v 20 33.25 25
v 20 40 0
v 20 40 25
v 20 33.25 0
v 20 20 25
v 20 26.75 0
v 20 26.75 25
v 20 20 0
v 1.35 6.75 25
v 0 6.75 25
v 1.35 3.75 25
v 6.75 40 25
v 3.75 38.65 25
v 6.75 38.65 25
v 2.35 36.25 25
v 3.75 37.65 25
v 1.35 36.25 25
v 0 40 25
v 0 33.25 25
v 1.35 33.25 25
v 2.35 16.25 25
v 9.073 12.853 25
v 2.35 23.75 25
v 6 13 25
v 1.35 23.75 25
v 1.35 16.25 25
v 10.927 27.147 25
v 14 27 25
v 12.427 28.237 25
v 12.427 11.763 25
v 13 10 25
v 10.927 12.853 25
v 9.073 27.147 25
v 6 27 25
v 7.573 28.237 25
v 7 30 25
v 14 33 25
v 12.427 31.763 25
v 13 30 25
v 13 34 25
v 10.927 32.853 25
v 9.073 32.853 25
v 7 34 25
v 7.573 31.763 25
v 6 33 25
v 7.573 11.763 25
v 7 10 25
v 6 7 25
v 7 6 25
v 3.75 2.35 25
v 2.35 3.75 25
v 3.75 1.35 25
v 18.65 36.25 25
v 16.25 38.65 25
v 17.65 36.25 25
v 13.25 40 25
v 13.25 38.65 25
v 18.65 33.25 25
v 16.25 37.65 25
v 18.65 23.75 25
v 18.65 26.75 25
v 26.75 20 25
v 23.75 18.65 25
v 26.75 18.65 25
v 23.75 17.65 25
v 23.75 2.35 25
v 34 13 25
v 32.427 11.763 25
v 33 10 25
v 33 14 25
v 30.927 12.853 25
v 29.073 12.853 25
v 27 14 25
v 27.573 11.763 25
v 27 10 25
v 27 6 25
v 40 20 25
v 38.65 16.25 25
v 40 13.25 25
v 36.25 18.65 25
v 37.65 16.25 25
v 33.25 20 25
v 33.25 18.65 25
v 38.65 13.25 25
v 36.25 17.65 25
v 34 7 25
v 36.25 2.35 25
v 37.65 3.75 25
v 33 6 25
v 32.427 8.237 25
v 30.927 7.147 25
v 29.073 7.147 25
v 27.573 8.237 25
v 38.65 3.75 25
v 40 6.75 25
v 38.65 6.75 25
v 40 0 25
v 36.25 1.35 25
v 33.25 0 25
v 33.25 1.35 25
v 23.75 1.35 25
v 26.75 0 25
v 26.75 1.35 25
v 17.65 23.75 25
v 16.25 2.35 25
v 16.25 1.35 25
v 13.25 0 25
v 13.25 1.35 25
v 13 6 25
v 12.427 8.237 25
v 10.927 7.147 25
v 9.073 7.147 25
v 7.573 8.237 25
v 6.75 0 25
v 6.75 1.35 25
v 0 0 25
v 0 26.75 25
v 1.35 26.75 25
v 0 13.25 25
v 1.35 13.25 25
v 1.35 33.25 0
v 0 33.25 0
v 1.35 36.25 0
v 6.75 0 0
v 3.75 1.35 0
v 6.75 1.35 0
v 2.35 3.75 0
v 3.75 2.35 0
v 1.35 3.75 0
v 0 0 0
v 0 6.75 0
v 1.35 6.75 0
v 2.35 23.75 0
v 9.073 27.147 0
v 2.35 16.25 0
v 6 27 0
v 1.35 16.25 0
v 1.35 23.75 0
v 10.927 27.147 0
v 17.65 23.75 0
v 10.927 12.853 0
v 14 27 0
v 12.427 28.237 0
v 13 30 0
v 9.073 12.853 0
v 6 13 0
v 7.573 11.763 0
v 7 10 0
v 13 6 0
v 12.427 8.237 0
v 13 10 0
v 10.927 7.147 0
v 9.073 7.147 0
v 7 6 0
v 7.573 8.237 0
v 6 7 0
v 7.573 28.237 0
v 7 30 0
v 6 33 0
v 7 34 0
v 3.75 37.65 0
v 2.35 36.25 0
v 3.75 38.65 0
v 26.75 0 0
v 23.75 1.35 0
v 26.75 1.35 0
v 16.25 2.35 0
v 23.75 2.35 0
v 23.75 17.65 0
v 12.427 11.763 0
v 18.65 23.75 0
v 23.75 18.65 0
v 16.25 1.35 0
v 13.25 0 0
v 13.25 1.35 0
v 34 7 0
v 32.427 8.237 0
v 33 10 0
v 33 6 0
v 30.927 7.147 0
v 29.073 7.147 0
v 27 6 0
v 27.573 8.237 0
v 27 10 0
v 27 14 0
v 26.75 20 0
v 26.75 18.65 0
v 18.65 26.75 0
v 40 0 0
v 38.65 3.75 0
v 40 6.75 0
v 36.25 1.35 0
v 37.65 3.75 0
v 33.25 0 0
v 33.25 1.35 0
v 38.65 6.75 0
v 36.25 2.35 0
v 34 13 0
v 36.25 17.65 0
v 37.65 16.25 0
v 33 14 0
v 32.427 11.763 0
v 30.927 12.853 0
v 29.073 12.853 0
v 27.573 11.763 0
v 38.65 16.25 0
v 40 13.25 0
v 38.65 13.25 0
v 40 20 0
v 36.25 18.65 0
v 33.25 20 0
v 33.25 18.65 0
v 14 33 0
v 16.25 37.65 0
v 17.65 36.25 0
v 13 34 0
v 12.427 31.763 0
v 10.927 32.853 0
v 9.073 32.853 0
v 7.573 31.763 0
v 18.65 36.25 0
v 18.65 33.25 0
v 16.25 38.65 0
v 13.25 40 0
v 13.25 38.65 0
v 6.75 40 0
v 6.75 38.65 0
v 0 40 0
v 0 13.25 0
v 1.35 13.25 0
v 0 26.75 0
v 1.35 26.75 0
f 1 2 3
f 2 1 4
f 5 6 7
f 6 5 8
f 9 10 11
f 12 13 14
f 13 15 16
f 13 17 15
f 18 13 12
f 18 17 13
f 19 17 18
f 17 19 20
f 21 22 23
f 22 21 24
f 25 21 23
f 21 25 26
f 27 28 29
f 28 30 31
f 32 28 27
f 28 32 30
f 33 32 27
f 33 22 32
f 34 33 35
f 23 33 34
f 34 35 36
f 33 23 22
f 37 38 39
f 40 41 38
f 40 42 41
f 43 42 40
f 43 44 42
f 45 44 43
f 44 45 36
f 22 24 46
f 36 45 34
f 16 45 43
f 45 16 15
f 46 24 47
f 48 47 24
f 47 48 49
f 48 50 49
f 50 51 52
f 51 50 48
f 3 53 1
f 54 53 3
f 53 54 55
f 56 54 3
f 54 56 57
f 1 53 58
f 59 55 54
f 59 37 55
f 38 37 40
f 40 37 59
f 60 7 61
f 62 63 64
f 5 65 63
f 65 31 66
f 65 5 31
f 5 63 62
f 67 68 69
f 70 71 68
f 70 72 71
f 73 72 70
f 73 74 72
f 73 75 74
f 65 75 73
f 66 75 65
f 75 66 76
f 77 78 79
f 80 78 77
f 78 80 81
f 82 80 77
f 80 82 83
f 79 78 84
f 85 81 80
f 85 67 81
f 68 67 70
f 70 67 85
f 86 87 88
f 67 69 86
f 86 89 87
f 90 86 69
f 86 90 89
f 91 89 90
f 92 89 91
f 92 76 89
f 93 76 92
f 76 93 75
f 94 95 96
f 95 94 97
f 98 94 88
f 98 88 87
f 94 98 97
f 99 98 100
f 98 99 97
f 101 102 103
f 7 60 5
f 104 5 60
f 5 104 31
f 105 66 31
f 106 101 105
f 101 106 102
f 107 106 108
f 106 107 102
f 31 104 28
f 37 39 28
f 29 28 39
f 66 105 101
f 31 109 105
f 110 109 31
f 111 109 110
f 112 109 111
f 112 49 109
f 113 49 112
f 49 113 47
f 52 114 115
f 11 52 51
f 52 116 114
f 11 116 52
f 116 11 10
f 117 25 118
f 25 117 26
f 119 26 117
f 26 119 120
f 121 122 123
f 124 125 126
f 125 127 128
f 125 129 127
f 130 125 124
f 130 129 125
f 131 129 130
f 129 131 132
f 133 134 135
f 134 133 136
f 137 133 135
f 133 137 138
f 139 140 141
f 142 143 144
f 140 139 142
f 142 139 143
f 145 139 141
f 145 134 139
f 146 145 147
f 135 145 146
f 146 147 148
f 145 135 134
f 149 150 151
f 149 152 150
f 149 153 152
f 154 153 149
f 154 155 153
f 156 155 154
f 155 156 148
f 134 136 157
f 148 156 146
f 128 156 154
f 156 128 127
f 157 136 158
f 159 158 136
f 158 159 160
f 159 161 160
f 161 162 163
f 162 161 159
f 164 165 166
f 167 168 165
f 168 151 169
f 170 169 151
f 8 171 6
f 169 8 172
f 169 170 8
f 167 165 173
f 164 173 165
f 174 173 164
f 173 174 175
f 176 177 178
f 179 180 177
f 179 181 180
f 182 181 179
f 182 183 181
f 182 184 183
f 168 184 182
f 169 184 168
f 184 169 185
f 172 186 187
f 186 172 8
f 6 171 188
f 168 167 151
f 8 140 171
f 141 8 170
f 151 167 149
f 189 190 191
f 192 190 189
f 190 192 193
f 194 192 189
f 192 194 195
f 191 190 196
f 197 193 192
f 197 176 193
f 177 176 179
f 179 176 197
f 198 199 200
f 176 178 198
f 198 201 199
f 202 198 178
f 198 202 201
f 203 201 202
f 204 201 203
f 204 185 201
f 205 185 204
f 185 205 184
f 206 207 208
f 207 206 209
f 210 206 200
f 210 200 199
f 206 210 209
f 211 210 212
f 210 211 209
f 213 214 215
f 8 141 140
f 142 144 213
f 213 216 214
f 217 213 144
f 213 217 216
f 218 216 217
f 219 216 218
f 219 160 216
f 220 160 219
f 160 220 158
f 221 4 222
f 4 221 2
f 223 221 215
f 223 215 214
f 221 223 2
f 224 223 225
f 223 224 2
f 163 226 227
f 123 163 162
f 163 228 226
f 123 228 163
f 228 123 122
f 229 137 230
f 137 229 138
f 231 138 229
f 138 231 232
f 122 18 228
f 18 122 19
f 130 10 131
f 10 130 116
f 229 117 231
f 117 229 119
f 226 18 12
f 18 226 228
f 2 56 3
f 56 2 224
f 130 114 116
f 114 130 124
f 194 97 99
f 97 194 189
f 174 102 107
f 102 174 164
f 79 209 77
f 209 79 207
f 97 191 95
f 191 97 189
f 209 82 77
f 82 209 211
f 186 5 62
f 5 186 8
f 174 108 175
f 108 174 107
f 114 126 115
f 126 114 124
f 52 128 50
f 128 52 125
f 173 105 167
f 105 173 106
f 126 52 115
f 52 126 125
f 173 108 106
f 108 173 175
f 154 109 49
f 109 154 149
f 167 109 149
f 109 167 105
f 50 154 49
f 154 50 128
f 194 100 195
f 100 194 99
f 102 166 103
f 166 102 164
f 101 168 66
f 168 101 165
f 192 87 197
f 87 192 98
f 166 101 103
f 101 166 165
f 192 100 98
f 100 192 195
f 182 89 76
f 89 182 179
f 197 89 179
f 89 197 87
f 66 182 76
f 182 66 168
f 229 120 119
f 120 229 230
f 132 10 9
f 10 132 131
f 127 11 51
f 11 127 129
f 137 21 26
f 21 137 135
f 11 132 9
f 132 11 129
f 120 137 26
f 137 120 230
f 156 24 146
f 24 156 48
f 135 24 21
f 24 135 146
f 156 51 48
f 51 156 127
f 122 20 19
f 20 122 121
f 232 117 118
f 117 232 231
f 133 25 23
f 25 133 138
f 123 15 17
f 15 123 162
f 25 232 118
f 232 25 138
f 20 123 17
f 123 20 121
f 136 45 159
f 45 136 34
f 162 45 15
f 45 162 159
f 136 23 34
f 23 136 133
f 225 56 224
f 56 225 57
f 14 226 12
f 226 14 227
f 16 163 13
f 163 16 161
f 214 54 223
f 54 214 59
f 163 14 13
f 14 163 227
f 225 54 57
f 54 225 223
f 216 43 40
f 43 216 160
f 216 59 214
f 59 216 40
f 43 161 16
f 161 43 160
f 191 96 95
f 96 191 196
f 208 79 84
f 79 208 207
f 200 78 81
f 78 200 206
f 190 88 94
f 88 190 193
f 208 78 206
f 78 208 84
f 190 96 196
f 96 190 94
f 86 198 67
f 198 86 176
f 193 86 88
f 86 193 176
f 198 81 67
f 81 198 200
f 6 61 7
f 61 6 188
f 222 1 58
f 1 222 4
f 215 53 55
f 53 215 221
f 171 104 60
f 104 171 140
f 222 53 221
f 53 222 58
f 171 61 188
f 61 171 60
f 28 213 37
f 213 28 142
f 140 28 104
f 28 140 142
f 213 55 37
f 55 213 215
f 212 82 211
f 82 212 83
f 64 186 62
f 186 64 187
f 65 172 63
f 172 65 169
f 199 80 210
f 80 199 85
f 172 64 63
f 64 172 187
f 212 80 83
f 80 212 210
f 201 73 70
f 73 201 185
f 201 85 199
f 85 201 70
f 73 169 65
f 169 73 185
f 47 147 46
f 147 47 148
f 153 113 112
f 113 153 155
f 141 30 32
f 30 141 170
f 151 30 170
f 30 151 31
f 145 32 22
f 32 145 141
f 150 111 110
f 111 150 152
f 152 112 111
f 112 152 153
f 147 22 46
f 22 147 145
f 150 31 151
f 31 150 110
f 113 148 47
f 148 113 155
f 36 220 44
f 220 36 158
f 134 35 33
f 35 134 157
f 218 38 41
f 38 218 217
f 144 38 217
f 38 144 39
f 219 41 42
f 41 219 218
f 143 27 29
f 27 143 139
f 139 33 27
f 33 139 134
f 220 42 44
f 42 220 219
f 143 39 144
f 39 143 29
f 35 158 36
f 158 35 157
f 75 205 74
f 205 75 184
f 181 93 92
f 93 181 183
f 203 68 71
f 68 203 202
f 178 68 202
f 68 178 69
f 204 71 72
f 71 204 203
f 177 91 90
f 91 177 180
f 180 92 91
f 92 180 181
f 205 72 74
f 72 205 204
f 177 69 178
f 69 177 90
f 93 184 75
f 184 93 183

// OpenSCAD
//Specify the height
Height = 25 ; // [1:1:500]
//Specify the inner diameter
InnerDiameter = 6 ; // [5:1:6]

2060_ProfileCorner ();

module 2060_ProfileCorner() {
    color ("silver")
    difference () {
        union () {
            translate ([0,0,0]) cube ([20,40,Height]);
            translate ([0,0,0]) cube ([40,20,Height]);
        }
        translate ([10,10,-1]) cylinder(d=InnerDiameter,h=+Height+2);
        translate ([10,30,-1]) cylinder(d=InnerDiameter,h=+Height+2);
        translate ([30,10,-1]) cylinder(d=InnerDiameter,h=+Height+2);

        translate ([0,0,0]) 2020_ProfileCutOut (Height=Height);
        translate ([20,0,0]) 2020_ProfileCutOut (Height=Height);
        translate ([0,0,0]) mirror ([1,0,0]) rotate ([0,0,90]) 2020_ProfileCutOut (Height=Height);
        translate ([0,20,0]) mirror ([1,0,0]) rotate ([0,0,90]) 2020_ProfileCutOut (Height=Height);
        translate ([0,40,0]) mirror ([0,1,0]) 2020_ProfileCutOut (Height=Height);
        translate ([40,20,0]) rotate ([0,0,-90]) mirror ([0,1,0]) 2020_ProfileCutOut (Height=Height);
        translate ([20,40,0]) rotate ([0,0,-90]) mirror ([0,1,0]) 2020_ProfileCutOut (Height=Height);
        translate ([20,20,0]) mirror ([0,1,0]) 2020_ProfileCutOut (Height=Height);

    }
}
module 2020_ProfileCutOut () {    
    union () {
        translate ([10-3.25,-0.5,-1]) cube ([6.5,6,Height+2]);
        hull () {
            translate ([10-6.25,1.35,-1]) cube ([12.5,1,Height+2]);
            translate ([10-3,5,-1]) cube ([6,1,Height+2]);
        }
    }
}
